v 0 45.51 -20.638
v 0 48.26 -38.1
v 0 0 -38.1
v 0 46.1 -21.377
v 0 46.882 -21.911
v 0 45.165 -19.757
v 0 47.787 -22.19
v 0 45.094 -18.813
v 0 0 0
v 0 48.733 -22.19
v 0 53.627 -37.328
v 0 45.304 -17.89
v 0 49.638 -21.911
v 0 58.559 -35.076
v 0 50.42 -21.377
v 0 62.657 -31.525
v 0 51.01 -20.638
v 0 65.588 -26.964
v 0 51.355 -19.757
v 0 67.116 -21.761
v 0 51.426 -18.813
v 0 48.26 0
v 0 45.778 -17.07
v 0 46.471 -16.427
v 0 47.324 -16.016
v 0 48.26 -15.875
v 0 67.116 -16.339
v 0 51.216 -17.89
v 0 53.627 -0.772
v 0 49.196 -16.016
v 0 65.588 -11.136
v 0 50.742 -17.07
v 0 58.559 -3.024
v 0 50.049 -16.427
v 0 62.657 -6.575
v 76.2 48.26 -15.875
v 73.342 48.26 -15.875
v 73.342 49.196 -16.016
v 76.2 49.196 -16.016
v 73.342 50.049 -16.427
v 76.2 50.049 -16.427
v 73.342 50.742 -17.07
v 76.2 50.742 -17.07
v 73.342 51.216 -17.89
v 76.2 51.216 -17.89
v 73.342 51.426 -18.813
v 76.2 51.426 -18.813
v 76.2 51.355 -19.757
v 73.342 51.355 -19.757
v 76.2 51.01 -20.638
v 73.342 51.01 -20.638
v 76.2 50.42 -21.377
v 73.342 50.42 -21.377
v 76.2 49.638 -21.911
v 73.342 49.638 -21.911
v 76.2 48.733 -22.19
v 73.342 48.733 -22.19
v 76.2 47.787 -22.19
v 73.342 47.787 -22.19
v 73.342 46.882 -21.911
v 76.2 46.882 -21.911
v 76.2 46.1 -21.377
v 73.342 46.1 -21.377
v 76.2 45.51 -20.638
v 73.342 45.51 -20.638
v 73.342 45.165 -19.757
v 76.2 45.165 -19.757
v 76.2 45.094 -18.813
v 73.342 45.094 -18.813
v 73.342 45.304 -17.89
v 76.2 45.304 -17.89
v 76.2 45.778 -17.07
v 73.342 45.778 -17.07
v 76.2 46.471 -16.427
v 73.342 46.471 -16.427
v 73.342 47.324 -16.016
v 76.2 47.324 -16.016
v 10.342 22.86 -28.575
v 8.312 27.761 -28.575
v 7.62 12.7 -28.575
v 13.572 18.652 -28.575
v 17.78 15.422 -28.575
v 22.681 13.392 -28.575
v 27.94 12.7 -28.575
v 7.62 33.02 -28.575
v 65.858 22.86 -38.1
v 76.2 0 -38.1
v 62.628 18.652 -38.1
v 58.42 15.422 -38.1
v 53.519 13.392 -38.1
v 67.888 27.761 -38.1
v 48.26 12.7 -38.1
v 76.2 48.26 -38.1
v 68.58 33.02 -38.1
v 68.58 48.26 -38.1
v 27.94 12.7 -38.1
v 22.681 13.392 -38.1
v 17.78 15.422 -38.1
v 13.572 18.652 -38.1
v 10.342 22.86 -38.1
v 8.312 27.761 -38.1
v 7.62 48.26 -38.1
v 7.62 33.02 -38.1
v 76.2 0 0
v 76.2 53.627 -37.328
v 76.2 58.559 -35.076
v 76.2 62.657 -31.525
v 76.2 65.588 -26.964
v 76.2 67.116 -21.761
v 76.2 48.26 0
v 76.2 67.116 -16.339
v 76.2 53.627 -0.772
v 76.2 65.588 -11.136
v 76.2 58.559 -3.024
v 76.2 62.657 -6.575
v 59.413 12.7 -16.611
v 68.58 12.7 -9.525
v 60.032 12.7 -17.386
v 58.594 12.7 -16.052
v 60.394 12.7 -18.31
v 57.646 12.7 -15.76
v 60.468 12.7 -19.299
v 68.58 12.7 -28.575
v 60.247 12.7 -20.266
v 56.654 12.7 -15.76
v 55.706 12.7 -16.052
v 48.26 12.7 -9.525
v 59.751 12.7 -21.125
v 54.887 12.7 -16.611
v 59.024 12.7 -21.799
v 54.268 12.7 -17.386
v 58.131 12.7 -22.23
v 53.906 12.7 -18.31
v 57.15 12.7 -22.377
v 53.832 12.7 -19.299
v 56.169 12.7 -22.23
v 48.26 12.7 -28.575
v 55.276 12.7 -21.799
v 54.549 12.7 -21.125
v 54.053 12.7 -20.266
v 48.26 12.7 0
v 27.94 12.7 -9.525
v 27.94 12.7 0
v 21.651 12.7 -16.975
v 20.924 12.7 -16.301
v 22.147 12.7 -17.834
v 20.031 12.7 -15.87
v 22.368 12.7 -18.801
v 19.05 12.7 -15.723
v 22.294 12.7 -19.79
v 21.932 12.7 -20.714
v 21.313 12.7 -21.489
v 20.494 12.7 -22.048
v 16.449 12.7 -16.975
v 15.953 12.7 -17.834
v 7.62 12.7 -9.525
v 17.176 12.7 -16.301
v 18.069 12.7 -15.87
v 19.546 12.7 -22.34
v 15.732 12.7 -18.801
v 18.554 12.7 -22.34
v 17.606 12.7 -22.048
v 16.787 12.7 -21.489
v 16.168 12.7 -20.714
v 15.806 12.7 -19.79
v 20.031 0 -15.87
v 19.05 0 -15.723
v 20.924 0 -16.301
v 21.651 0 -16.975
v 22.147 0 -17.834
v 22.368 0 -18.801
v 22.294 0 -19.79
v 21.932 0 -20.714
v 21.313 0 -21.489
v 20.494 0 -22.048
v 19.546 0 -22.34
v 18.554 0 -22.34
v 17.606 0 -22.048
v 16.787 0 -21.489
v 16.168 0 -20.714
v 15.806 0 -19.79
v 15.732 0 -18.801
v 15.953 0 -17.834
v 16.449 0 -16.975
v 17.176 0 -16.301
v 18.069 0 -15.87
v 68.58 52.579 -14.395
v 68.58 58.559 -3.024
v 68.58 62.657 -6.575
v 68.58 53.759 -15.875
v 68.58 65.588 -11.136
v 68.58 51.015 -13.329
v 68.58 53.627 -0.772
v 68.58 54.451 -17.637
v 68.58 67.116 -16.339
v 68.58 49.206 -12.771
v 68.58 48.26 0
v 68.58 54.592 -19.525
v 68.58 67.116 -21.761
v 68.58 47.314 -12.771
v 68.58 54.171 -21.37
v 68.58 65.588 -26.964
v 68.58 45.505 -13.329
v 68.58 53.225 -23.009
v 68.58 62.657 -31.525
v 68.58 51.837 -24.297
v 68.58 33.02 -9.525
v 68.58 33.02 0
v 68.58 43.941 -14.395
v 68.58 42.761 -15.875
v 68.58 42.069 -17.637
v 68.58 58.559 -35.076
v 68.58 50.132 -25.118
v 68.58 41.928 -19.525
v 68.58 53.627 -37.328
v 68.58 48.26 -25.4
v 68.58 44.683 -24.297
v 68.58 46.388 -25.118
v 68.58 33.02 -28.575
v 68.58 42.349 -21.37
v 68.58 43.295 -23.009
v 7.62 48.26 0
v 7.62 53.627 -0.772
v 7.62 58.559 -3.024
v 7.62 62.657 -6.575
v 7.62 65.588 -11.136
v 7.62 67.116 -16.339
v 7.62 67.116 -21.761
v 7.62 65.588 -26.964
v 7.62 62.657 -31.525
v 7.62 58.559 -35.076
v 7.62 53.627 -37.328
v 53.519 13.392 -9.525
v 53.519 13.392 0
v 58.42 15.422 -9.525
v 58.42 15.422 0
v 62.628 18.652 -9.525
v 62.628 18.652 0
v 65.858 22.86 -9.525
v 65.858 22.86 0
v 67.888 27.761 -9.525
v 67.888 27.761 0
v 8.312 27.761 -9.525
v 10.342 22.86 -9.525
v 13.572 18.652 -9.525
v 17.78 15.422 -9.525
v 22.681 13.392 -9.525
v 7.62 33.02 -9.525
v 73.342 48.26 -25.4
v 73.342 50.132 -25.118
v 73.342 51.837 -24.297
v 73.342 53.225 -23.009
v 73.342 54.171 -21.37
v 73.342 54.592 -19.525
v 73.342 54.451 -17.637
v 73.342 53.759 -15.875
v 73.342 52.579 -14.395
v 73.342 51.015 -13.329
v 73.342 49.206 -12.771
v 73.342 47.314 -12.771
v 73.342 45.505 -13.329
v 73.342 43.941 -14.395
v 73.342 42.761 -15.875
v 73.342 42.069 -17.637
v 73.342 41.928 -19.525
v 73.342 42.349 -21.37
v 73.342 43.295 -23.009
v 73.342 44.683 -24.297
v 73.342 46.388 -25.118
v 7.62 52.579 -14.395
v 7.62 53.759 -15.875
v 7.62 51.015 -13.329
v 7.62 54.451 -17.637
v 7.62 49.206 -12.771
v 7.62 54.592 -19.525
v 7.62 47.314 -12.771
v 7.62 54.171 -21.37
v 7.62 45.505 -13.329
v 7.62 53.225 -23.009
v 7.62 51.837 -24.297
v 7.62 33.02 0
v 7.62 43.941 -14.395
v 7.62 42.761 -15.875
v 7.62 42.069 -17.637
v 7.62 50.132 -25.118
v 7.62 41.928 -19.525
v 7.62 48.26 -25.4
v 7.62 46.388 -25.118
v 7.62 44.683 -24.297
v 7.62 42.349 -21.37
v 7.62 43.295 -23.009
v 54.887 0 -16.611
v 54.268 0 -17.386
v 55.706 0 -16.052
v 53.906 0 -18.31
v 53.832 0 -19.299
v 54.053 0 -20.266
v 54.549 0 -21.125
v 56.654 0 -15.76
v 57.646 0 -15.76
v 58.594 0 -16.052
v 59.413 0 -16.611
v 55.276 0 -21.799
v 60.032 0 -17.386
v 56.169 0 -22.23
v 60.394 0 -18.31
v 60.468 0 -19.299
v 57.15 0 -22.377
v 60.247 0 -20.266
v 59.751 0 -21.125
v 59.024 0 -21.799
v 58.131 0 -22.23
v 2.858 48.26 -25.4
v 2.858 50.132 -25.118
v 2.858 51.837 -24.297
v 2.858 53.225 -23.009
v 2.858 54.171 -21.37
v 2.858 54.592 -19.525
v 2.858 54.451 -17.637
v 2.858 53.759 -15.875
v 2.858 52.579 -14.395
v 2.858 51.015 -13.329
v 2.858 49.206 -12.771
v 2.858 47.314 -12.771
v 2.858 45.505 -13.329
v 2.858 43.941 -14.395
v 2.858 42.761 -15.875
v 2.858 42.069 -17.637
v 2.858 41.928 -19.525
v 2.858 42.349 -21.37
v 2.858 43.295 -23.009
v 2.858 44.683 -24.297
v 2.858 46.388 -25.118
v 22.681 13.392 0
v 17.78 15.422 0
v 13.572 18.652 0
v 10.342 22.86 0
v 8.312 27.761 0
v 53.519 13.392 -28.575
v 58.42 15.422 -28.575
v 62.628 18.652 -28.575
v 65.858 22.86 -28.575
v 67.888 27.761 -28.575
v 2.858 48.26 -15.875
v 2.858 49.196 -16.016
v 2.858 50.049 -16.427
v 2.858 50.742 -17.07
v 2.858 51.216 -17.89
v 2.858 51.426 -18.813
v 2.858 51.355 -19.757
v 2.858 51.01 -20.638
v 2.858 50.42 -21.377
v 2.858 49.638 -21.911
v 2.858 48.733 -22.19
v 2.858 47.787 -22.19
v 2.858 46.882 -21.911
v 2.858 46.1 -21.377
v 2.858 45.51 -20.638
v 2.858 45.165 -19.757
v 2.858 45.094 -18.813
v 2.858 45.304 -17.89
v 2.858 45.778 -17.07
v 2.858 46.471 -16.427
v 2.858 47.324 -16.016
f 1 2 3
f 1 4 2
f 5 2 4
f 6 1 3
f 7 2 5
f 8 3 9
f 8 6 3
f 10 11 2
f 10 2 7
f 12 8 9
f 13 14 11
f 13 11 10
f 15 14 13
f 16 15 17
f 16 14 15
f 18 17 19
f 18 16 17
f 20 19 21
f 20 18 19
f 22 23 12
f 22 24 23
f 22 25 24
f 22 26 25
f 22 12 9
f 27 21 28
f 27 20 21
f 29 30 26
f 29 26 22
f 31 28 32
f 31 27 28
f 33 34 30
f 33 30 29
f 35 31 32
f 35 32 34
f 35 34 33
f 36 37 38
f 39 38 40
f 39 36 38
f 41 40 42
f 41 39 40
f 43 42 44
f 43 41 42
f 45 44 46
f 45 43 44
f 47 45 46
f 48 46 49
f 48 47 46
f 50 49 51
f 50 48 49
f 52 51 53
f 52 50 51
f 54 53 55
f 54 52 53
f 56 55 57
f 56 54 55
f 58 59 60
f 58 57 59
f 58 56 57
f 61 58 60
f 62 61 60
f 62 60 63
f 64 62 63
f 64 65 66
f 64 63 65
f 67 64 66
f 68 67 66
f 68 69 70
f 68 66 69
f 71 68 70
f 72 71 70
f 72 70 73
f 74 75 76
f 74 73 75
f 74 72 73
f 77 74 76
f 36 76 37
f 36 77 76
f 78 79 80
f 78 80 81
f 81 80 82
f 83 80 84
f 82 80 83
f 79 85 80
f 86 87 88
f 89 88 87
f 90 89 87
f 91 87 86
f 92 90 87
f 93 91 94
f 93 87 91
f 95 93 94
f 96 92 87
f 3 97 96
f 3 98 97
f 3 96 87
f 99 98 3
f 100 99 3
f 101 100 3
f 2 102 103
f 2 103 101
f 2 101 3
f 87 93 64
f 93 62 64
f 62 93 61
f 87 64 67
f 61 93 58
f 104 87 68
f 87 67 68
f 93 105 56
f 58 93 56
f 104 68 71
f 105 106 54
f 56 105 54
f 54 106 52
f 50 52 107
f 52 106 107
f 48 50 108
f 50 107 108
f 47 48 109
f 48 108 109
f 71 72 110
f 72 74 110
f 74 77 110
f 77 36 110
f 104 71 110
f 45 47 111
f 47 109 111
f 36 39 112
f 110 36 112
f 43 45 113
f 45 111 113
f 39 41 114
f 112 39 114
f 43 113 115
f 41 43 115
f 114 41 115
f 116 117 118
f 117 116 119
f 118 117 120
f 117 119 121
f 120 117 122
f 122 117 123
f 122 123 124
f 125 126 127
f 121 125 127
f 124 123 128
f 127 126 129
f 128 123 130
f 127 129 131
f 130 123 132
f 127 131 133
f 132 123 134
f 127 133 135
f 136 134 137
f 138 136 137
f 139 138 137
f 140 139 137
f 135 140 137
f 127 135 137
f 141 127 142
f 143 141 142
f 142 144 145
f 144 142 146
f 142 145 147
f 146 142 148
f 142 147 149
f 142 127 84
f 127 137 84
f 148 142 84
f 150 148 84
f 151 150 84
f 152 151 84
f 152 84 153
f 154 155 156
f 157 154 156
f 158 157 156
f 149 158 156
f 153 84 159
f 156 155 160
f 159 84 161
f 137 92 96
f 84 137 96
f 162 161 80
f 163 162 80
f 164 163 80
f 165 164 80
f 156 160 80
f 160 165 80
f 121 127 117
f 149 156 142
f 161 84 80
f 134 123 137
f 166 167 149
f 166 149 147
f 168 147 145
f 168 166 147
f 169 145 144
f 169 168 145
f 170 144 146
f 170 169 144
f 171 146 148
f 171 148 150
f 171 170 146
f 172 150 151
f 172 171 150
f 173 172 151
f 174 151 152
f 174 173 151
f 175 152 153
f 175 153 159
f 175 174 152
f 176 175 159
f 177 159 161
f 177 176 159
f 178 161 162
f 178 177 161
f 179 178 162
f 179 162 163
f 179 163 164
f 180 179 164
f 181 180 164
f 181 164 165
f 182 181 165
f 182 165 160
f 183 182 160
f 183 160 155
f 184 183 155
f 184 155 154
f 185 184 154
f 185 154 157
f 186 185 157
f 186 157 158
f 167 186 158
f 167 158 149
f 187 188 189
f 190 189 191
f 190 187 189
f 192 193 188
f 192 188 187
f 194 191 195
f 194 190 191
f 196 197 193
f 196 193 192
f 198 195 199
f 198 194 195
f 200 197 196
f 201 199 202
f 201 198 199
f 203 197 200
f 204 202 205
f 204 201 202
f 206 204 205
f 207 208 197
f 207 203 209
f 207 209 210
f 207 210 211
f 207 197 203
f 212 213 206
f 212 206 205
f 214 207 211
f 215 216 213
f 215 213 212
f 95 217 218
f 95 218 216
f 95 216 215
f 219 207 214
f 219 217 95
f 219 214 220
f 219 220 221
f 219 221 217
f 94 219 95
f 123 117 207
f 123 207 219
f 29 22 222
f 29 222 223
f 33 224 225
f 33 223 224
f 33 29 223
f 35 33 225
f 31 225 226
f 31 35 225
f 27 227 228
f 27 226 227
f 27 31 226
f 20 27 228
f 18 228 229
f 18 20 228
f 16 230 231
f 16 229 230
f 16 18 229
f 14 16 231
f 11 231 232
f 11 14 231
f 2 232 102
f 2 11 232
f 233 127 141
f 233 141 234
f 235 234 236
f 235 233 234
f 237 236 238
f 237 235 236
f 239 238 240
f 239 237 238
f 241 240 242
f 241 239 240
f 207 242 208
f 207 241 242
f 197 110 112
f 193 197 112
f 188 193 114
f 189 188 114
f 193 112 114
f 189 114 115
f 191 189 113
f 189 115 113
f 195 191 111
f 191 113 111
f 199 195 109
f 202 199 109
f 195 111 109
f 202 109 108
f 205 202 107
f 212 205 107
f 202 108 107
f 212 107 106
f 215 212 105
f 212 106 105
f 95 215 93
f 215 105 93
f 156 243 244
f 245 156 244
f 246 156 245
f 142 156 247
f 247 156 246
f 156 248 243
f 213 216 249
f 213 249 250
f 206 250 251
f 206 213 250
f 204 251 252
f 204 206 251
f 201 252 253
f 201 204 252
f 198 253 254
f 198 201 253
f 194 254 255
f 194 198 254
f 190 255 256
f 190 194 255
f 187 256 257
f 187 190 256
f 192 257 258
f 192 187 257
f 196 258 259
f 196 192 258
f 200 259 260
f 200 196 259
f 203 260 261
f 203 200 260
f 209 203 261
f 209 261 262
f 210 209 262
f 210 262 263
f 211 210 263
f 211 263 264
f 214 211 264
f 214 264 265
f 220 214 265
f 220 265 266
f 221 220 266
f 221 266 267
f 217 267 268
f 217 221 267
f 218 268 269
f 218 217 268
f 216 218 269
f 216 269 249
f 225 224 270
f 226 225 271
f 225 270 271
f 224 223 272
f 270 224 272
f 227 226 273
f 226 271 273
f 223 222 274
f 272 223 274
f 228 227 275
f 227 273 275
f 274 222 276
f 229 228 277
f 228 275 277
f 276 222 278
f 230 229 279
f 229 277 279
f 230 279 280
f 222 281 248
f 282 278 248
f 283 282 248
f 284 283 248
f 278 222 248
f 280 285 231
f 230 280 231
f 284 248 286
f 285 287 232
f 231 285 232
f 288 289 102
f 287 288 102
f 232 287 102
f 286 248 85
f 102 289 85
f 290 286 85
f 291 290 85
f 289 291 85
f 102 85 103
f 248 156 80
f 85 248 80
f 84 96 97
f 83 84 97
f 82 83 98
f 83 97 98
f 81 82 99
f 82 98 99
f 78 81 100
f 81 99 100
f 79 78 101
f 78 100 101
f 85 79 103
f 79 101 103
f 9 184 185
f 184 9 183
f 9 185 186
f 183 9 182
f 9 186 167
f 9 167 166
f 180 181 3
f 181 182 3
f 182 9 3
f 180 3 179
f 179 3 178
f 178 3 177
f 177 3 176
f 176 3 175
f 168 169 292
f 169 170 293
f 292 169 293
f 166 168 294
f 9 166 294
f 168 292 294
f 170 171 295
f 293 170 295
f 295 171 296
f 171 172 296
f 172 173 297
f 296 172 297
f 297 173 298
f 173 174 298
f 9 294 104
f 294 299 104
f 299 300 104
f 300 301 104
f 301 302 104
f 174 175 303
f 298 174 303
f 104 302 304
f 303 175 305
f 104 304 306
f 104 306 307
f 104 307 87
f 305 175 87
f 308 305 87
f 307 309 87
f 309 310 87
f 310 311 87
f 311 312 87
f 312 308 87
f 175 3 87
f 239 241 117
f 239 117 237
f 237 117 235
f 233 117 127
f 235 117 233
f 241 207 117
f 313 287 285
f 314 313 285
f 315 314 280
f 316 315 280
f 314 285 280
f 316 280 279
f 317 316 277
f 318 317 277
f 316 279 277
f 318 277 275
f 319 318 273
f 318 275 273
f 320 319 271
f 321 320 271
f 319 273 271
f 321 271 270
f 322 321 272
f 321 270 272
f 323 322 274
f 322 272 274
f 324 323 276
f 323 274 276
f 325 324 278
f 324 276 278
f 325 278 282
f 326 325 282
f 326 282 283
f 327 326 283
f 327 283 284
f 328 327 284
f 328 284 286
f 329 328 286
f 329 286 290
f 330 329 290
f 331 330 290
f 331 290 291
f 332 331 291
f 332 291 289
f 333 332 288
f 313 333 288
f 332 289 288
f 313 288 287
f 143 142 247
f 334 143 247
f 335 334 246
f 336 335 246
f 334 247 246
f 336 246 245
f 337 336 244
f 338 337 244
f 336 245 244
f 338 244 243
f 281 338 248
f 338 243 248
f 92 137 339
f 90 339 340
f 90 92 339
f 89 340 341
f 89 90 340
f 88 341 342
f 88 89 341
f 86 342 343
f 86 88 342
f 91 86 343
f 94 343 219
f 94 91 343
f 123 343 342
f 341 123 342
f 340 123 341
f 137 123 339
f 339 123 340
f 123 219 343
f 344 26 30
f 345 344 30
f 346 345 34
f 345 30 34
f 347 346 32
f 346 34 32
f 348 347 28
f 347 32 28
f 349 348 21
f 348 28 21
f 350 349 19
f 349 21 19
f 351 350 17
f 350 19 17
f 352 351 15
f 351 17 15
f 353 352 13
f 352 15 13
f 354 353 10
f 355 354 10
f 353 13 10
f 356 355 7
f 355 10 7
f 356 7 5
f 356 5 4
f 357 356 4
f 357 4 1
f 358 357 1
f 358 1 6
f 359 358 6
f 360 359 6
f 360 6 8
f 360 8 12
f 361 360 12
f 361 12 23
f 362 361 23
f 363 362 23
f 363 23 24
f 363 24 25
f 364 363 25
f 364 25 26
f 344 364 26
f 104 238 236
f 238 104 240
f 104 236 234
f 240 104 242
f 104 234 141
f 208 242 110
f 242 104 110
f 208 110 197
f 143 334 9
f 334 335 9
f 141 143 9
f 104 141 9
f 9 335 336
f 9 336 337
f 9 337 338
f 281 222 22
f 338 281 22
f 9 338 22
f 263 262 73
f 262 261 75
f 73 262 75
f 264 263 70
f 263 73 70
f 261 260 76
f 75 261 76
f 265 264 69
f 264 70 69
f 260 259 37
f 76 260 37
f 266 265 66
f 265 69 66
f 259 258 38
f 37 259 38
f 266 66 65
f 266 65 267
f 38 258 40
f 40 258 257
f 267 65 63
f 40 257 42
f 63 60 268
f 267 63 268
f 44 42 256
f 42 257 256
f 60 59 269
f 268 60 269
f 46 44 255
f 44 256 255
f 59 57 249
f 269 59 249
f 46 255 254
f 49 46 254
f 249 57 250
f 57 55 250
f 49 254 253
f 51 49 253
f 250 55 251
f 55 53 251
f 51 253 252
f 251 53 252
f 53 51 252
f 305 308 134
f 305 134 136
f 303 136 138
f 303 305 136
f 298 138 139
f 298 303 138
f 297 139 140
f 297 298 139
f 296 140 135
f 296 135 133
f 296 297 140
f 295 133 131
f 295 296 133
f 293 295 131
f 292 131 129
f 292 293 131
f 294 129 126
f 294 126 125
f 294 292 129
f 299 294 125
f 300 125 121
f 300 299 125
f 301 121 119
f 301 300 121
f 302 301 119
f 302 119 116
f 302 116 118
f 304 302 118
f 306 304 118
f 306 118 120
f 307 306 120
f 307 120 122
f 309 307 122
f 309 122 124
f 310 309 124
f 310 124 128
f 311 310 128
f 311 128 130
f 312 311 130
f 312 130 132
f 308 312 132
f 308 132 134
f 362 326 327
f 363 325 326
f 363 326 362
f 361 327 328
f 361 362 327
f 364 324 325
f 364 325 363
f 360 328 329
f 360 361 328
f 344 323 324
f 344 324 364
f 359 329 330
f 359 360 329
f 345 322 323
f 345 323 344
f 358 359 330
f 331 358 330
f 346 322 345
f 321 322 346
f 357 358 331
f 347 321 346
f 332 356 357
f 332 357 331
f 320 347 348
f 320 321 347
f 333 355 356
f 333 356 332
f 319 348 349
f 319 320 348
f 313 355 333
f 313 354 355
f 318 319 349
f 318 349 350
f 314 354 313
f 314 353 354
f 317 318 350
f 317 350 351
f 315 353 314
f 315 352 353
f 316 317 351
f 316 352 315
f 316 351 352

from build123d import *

# Parameters (mm, degrees)
SKETCH1_W           = 76.2
SKETCH1_H           = 38.1
SKETCH1_R           = 3.3274
BOSS_EXTRUDE1_DEPTH = 12.7
SKETCH5_R           = 3.175
BOSS_EXTRUDE3_DEPTH = 7.62
FILLET3_START       = -15.722599236
FILLET3_DEPTH       = 15.722599236
FILLET3_START_2     = -38.1
FILLET3_2_DEPTH     = 15.722595954
FILLET3_START_3     = -22.377404046
FILLET3_3_DEPTH     = 6.65480481
FILLET3_START_4     = 12.7
FILLET3_4_OUTLINE_R = 3.3274
FILLET3_4_DEPTH     = 20.32
SKETCH11_W          = 25.4
SKETCH11_H          = 19.05
CUT_EXTRUDE2_DEPTH  = 102.194377846
SKETCH13_R          = 6.35
CUT_EXTRUDE3_DEPTH  = 4.7625


with BuildPart() as part:
    # Sketch1 → Boss-Extrude1 (new body)
    with BuildSketch(Plane(origin=(0, 0, 0), x_dir=(1, 0, 0), z_dir=(0, 1, 0))):
        with Locations((38.1, 19.05)):
            Rectangle(SKETCH1_W, SKETCH1_H)
        with Locations(Location((19.05, 19.05, 0), (0, 0, 270))):
            Circle(SKETCH1_R, mode=Mode.SUBTRACT)
        with Locations(Location((57.15, 19.05, 0), (0, 0, 90))):
            Circle(SKETCH1_R, mode=Mode.SUBTRACT)
    extrude(amount=BOSS_EXTRUDE1_DEPTH)

    # Sketch5 → Boss-Extrude3 (add)
    with BuildSketch(Plane.ZY):
        with BuildLine():
            Line((-38.1, 12.7), (0, 12.7))
            Line((0, 12.7), (0, 48.26))
            ThreePointArc((0, 48.26), (-19.05, 67.31), (-38.1, 48.26))
            Line((-38.1, 48.26), (-38.1, 12.7))
        make_face()
        with Locations((-19.05, 48.26)):
            Circle(SKETCH5_R, mode=Mode.SUBTRACT)
    boss_extrude3 = extrude(amount=-BOSS_EXTRUDE3_DEPTH)

    # Fillet3: read off the stored shape, not the designer's step
    # Fillet3 outline → Fillet3 (add)
    with BuildSketch(Plane.XY.offset(FILLET3_START)):
        with BuildLine():
            Line((7.62, 12.7), (27.94, 12.7))
            ThreePointArc((27.94, 12.7), (13.571590206, 18.651590206), (7.62, 33.02))
            Line((7.62, 33.02), (7.62, 12.7))
        make_face()
    fillet3 = extrude(amount=FILLET3_DEPTH)

    # Fillet3 2 outline → Fillet3 2 (add)
    with BuildSketch(Plane.XY.offset(FILLET3_START_2)):
        with BuildLine():
            Line((7.62, 12.7), (27.94, 12.7))
            ThreePointArc((27.94, 12.7), (13.571590206, 18.651590206), (7.62, 33.02))
            Line((7.62, 33.02), (7.62, 12.7))
        make_face()
    fillet3_2 = extrude(amount=FILLET3_2_DEPTH)

    # Fillet3 3 outline → Fillet3 3 (add)
    with BuildSketch(Plane.XY.offset(FILLET3_START_3)):
        with BuildLine():
            Line((7.62, 12.7), (27.94, 12.7))
            ThreePointArc((27.94, 12.7), (13.571590206, 18.651590206), (7.62, 33.02))
            Line((7.62, 33.02), (7.62, 12.7))
        make_face()
    fillet3_3 = extrude(amount=FILLET3_3_DEPTH)

    # Fillet3 4 outline → Fillet3 4 (cut)
    with BuildSketch(Plane(origin=(0, 0, 0), x_dir=(1, 0, 0), z_dir=(0, 1, 0)).offset(FILLET3_START_4)):
        with Locations((19.05, 19.05)):
            Circle(FILLET3_4_OUTLINE_R)
    fillet3_4 = extrude(amount=FILLET3_4_DEPTH, mode=Mode.SUBTRACT)

    # Sketch11 → Cut-Extrude2 (cut, through all)
    with BuildSketch(Plane(origin=(0, 12.7, 0), x_dir=(1, 0, 0), z_dir=(0, 1, 0))):
        with Locations((20.32, 19.05)):
            Rectangle(SKETCH11_W, SKETCH11_H)
    cut_extrude2 = extrude(amount=CUT_EXTRUDE2_DEPTH, mode=Mode.SUBTRACT)

    # Sketch13 → Cut-Extrude3 (cut)
    with BuildSketch(Plane(origin=(7.62, 0, 0), x_dir=(0, 0, -1), z_dir=(1, 0, 0))):
        with Locations((19.05, 48.26)):
            Circle(SKETCH13_R)
    cut_extrude3 = extrude(amount=-CUT_EXTRUDE3_DEPTH, mode=Mode.SUBTRACT)

    # Mirror3: Boss-Extrude3, Fillet3, Fillet3 2, Fillet3 3, Fillet3 4 across plane
    add(boss_extrude3.mirror(Plane(origin=(38.1, 0, 0), x_dir=(0, 0, 1), z_dir=(1, 0, 0))))
    add(fillet3.mirror(Plane(origin=(38.1, 0, 0), x_dir=(0, 0, 1), z_dir=(1, 0, 0))))
    add(fillet3_2.mirror(Plane(origin=(38.1, 0, 0), x_dir=(0, 0, 1), z_dir=(1, 0, 0))))
    add(fillet3_3.mirror(Plane(origin=(38.1, 0, 0), x_dir=(0, 0, 1), z_dir=(1, 0, 0))))
    add(fillet3_4.mirror(Plane(origin=(38.1, 0, 0), x_dir=(0, 0, 1), z_dir=(1, 0, 0))), mode=Mode.SUBTRACT)

    # Mirror4: Cut-Extrude2 across plane
    add(cut_extrude2.mirror(Plane(origin=(38.1, 0, 0), x_dir=(0, 0, 1), z_dir=(1, 0, 0))), mode=Mode.SUBTRACT)

    # Mirror5: Cut-Extrude3 across plane
    add(cut_extrude3.mirror(Plane(origin=(38.1, 0, 0), x_dir=(0, 0, 1), z_dir=(1, 0, 0))), mode=Mode.SUBTRACT)


solid = part.part
